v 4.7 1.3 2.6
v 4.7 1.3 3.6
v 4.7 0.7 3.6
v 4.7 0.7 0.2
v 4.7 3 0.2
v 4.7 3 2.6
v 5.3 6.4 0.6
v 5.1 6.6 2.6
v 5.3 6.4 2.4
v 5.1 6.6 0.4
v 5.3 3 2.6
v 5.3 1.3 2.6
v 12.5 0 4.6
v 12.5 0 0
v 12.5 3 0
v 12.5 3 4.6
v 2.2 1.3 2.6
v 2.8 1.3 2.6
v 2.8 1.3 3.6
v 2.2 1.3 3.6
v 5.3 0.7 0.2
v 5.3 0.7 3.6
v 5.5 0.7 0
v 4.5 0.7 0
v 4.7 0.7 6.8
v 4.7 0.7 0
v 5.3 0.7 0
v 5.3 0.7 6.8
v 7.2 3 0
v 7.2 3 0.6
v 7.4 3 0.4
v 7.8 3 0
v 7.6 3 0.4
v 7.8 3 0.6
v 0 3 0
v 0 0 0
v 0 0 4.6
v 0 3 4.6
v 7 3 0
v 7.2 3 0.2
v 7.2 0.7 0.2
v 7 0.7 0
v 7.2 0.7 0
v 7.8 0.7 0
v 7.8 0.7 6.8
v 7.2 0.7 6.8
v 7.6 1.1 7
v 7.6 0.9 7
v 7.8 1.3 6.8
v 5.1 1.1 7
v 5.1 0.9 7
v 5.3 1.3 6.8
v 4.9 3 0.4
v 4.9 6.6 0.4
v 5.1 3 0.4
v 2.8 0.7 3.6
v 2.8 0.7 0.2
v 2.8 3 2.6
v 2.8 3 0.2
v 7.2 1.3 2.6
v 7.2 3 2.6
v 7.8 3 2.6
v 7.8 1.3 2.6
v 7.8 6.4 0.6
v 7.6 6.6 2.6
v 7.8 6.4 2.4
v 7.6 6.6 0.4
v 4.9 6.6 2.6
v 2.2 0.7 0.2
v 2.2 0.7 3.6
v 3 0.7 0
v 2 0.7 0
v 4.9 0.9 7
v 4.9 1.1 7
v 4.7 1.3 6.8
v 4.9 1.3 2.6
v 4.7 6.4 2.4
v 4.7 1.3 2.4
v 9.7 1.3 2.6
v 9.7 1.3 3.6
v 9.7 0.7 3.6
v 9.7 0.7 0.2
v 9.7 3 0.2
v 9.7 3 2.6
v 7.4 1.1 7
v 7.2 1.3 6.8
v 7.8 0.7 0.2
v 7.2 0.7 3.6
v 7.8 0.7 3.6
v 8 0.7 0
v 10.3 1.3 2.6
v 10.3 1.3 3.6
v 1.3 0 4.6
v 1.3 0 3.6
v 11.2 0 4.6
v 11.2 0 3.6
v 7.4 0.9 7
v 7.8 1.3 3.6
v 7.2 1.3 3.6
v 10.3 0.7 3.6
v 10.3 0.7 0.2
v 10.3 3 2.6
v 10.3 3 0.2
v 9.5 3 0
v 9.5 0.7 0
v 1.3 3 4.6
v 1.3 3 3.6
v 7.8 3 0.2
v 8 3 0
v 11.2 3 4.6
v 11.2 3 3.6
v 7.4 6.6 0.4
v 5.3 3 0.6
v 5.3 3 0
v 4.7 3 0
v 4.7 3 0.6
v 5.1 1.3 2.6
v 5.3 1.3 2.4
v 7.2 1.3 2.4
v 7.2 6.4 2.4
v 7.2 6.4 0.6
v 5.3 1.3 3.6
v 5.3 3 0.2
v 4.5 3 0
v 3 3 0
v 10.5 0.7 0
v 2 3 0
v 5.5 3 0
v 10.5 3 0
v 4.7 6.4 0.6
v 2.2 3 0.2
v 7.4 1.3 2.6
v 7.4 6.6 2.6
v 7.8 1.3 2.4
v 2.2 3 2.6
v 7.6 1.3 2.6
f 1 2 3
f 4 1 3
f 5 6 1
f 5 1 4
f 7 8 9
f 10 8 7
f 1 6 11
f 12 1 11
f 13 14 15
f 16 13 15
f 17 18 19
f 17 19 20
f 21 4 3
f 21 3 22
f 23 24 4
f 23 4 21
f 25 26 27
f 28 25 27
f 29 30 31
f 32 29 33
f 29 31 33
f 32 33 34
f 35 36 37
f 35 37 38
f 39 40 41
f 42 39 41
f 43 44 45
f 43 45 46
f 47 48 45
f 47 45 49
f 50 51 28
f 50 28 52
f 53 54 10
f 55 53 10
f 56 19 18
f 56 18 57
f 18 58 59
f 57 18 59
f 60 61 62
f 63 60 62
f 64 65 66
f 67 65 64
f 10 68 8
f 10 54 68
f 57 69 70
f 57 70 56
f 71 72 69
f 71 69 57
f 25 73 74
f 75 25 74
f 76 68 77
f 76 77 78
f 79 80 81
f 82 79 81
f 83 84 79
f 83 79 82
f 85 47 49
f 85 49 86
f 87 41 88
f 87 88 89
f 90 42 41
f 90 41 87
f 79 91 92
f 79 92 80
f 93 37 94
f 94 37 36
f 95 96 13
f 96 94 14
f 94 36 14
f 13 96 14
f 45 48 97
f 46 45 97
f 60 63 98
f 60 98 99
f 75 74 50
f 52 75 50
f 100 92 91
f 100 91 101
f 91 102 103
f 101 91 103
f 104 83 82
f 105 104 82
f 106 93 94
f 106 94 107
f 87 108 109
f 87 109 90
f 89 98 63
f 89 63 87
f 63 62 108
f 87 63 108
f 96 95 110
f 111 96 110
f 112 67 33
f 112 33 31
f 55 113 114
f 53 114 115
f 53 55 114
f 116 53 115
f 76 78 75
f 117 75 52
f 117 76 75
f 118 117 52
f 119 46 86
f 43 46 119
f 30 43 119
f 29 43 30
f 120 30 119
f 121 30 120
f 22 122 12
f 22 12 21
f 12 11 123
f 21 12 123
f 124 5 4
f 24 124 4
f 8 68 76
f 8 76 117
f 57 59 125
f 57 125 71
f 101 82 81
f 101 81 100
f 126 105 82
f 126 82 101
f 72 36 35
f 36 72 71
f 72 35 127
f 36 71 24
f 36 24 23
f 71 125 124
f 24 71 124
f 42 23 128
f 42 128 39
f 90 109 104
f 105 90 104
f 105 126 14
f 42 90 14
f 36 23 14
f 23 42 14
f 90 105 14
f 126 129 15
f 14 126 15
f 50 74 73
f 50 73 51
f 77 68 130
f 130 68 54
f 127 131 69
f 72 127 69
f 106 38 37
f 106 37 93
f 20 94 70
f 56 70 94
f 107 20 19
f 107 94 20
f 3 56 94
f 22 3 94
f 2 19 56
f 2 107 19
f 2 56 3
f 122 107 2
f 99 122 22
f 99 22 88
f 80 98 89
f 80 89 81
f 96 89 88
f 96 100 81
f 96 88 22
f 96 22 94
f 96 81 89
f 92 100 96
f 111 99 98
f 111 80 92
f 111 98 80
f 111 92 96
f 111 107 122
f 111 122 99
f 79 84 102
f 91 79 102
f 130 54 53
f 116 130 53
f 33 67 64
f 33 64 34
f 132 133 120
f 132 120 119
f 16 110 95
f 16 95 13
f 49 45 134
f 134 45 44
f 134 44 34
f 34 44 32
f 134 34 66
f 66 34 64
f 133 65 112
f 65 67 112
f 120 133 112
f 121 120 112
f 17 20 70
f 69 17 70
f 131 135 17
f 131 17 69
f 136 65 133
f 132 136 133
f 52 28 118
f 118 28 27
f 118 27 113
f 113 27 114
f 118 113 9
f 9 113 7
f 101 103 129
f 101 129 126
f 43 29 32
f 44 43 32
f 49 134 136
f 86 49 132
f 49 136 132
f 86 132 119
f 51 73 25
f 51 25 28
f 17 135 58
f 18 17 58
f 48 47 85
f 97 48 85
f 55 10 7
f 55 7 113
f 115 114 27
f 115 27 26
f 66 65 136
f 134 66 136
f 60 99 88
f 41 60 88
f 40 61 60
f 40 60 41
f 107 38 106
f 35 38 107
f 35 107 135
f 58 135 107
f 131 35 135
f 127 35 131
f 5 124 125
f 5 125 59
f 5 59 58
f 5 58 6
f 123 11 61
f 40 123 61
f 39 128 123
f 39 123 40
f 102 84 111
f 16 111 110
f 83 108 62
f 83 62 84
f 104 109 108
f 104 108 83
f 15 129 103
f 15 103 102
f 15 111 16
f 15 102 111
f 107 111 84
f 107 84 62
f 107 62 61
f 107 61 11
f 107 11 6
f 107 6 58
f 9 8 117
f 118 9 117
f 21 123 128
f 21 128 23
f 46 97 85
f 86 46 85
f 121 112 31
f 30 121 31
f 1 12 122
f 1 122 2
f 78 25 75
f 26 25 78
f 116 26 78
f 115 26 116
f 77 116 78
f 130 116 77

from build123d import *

# Parameters (mm, degrees)
SKETCH_1_W          = 12.5
SKETCH_1_H          = 3
EXTRUDE_1_DEPTH     = 4.6
SKETCH_2_W          = 9.9
SKETCH_2_H          = 3
CUT_EXTRUDE_1_DEPTH = 1
SKETCH_3_W          = 0.6
SKETCH_3_H          = 2.6
CUT_EXTRUDE_2_DEPTH = 2.3
CHAMFER_1_SIZE      = 0.2
SKETCH_5_W          = 0.6
SKETCH_5_H          = 0.6
CUT_EXTRUDE_3_DEPTH = 14.115258289
SKETCH_6_W          = 0.6
SKETCH_6_H          = 2.2
EXTRUDE_2_DEPTH     = 5.9
SKETCH_9_W          = 0.6
SKETCH_9_H          = 2.3
EXTRUDE_8_DEPTH     = 0.4
SKETCH_8_W          = 0.6
SKETCH_8_H          = 0.6
EXTRUDE_7_DEPTH     = 4.4
CHAMFER_2_SIZE      = 0.2


with BuildPart() as part:
    # Эскиз1 → Бобышка-Вытянуть1 (new body)
    with BuildSketch(Plane.XY):
        with Locations((6.25, 1.5)):
            Rectangle(SKETCH_1_W, SKETCH_1_H)
    extrude(amount=EXTRUDE_1_DEPTH)

    # Эскиз2 → Вырез-Вытянуть1 (cut)
    with BuildSketch(Plane.XY.offset(4.6)):
        with Locations((6.25, 1.5)):
            Rectangle(SKETCH_2_W, SKETCH_2_H)
    extrude(amount=-CUT_EXTRUDE_1_DEPTH, mode=Mode.SUBTRACT)

    # Эскиз3 → Вырез-Вытянуть2 (cut)
    with BuildSketch(Plane(origin=(0, 3, 0), x_dir=(1, 0, 0), z_dir=(0, 1, 0))):
        with Locations((2.5, -1.3)):
            Rectangle(SKETCH_3_W, SKETCH_3_H)
        with Locations((5, -1.3)):
            Rectangle(SKETCH_3_W, SKETCH_3_H)
        with Locations((7.5, -1.3)):
            Rectangle(SKETCH_3_W, SKETCH_3_H)
        with Locations((10, -1.3)):
            Rectangle(SKETCH_3_W, SKETCH_3_H)
    extrude(amount=-CUT_EXTRUDE_2_DEPTH, mode=Mode.SUBTRACT)

    # Фаска1
    chamfer_1_edges = [part.edges().sort_by_distance(p)[0] for p in [
        (2.8, 1.85, 0),
        (2.2, 1.85, 0),
        (5.3, 1.85, 0),
        (4.7, 1.85, 0),
        (7.8, 1.85, 0),
        (7.2, 1.85, 0),
        (10.3, 1.85, 0),
        (9.7, 1.85, 0),
    ]]
    chamfer(chamfer_1_edges, length=CHAMFER_1_SIZE)

    # Эскиз5 → Вырез-Вытянуть3 (cut, through all)
    with BuildSketch(Plane(origin=(0, 0, 2.6), x_dir=(-1, 0, 0), z_dir=(0, 0, -1))):
        with Locations((-10, 1)):
            Rectangle(SKETCH_5_W, SKETCH_5_H)
        with Locations((-7.5, 1)):
            Rectangle(SKETCH_5_W, SKETCH_5_H)
        with Locations((-5, 1)):
            Rectangle(SKETCH_5_W, SKETCH_5_H)
        with Locations((-2.5, 1)):
            Rectangle(SKETCH_5_W, SKETCH_5_H)
    extrude(amount=-CUT_EXTRUDE_3_DEPTH, mode=Mode.SUBTRACT)


with BuildPart() as body_2:
    # Эскиз6 → Бобышка-Вытянуть2 (new body)
    with BuildSketch(Plane(origin=(0, 6.6, 0), x_dir=(1, 0, 0), z_dir=(0, 1, 0))):
        with Locations((5, -1.5)):
            Rectangle(SKETCH_6_W, SKETCH_6_H)
    extrude(amount=-EXTRUDE_2_DEPTH)

    # Эскиз9 → Бобышка-Вытянуть8 (add)
    with BuildSketch(Plane(origin=(0, 0, 0.4), x_dir=(-1, 0, 0), z_dir=(0, 0, -1))):
        with Locations((-5, 1.85)):
            Rectangle(SKETCH_9_W, SKETCH_9_H)
    extrude(amount=EXTRUDE_8_DEPTH)

    # Эскиз8 → Бобышка-Вытянуть7 (add)
    with BuildSketch(Plane.XY.offset(2.6)):
        with Locations((5, 1)):
            Rectangle(SKETCH_8_W, SKETCH_8_H)
    extrude(amount=EXTRUDE_7_DEPTH)

    # Фаска2
    chamfer_2_edges = [body_2.edges().sort_by_distance(p)[0] for p in [
        (4.7, 3.95, 2.6),
        (4.7, 4.8, 0.4),
        (4.7, 6.6, 1.5),
        (5.3, 3.95, 2.6),
        (5.3, 6.6, 1.5),
        (5.3, 4.8, 0.4),
        (4.7, 1, 7),
        (5.3, 1, 7),
        (5, 1.3, 7),
        (5, 0.7, 7),
    ]]
    chamfer(chamfer_2_edges, length=CHAMFER_2_SIZE)


with BuildPart() as body_3:
    # Зеркальное отражение1: mirrored copy
    add(body_2.part.mirror(Plane(origin=(6.25, 0, 0), x_dir=(0, 0, 1), z_dir=(1, 0, 0))))


solid = Compound([part.part, body_2.part, body_3.part])
